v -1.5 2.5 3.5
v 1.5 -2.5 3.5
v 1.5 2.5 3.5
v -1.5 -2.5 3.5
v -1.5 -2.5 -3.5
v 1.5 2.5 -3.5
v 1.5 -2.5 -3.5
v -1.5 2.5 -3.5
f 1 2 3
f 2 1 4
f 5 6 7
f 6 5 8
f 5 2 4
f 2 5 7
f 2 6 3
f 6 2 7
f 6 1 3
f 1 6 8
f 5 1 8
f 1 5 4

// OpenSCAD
// cube with a size vector, centered
cube([3, 5, 7], center = true);
